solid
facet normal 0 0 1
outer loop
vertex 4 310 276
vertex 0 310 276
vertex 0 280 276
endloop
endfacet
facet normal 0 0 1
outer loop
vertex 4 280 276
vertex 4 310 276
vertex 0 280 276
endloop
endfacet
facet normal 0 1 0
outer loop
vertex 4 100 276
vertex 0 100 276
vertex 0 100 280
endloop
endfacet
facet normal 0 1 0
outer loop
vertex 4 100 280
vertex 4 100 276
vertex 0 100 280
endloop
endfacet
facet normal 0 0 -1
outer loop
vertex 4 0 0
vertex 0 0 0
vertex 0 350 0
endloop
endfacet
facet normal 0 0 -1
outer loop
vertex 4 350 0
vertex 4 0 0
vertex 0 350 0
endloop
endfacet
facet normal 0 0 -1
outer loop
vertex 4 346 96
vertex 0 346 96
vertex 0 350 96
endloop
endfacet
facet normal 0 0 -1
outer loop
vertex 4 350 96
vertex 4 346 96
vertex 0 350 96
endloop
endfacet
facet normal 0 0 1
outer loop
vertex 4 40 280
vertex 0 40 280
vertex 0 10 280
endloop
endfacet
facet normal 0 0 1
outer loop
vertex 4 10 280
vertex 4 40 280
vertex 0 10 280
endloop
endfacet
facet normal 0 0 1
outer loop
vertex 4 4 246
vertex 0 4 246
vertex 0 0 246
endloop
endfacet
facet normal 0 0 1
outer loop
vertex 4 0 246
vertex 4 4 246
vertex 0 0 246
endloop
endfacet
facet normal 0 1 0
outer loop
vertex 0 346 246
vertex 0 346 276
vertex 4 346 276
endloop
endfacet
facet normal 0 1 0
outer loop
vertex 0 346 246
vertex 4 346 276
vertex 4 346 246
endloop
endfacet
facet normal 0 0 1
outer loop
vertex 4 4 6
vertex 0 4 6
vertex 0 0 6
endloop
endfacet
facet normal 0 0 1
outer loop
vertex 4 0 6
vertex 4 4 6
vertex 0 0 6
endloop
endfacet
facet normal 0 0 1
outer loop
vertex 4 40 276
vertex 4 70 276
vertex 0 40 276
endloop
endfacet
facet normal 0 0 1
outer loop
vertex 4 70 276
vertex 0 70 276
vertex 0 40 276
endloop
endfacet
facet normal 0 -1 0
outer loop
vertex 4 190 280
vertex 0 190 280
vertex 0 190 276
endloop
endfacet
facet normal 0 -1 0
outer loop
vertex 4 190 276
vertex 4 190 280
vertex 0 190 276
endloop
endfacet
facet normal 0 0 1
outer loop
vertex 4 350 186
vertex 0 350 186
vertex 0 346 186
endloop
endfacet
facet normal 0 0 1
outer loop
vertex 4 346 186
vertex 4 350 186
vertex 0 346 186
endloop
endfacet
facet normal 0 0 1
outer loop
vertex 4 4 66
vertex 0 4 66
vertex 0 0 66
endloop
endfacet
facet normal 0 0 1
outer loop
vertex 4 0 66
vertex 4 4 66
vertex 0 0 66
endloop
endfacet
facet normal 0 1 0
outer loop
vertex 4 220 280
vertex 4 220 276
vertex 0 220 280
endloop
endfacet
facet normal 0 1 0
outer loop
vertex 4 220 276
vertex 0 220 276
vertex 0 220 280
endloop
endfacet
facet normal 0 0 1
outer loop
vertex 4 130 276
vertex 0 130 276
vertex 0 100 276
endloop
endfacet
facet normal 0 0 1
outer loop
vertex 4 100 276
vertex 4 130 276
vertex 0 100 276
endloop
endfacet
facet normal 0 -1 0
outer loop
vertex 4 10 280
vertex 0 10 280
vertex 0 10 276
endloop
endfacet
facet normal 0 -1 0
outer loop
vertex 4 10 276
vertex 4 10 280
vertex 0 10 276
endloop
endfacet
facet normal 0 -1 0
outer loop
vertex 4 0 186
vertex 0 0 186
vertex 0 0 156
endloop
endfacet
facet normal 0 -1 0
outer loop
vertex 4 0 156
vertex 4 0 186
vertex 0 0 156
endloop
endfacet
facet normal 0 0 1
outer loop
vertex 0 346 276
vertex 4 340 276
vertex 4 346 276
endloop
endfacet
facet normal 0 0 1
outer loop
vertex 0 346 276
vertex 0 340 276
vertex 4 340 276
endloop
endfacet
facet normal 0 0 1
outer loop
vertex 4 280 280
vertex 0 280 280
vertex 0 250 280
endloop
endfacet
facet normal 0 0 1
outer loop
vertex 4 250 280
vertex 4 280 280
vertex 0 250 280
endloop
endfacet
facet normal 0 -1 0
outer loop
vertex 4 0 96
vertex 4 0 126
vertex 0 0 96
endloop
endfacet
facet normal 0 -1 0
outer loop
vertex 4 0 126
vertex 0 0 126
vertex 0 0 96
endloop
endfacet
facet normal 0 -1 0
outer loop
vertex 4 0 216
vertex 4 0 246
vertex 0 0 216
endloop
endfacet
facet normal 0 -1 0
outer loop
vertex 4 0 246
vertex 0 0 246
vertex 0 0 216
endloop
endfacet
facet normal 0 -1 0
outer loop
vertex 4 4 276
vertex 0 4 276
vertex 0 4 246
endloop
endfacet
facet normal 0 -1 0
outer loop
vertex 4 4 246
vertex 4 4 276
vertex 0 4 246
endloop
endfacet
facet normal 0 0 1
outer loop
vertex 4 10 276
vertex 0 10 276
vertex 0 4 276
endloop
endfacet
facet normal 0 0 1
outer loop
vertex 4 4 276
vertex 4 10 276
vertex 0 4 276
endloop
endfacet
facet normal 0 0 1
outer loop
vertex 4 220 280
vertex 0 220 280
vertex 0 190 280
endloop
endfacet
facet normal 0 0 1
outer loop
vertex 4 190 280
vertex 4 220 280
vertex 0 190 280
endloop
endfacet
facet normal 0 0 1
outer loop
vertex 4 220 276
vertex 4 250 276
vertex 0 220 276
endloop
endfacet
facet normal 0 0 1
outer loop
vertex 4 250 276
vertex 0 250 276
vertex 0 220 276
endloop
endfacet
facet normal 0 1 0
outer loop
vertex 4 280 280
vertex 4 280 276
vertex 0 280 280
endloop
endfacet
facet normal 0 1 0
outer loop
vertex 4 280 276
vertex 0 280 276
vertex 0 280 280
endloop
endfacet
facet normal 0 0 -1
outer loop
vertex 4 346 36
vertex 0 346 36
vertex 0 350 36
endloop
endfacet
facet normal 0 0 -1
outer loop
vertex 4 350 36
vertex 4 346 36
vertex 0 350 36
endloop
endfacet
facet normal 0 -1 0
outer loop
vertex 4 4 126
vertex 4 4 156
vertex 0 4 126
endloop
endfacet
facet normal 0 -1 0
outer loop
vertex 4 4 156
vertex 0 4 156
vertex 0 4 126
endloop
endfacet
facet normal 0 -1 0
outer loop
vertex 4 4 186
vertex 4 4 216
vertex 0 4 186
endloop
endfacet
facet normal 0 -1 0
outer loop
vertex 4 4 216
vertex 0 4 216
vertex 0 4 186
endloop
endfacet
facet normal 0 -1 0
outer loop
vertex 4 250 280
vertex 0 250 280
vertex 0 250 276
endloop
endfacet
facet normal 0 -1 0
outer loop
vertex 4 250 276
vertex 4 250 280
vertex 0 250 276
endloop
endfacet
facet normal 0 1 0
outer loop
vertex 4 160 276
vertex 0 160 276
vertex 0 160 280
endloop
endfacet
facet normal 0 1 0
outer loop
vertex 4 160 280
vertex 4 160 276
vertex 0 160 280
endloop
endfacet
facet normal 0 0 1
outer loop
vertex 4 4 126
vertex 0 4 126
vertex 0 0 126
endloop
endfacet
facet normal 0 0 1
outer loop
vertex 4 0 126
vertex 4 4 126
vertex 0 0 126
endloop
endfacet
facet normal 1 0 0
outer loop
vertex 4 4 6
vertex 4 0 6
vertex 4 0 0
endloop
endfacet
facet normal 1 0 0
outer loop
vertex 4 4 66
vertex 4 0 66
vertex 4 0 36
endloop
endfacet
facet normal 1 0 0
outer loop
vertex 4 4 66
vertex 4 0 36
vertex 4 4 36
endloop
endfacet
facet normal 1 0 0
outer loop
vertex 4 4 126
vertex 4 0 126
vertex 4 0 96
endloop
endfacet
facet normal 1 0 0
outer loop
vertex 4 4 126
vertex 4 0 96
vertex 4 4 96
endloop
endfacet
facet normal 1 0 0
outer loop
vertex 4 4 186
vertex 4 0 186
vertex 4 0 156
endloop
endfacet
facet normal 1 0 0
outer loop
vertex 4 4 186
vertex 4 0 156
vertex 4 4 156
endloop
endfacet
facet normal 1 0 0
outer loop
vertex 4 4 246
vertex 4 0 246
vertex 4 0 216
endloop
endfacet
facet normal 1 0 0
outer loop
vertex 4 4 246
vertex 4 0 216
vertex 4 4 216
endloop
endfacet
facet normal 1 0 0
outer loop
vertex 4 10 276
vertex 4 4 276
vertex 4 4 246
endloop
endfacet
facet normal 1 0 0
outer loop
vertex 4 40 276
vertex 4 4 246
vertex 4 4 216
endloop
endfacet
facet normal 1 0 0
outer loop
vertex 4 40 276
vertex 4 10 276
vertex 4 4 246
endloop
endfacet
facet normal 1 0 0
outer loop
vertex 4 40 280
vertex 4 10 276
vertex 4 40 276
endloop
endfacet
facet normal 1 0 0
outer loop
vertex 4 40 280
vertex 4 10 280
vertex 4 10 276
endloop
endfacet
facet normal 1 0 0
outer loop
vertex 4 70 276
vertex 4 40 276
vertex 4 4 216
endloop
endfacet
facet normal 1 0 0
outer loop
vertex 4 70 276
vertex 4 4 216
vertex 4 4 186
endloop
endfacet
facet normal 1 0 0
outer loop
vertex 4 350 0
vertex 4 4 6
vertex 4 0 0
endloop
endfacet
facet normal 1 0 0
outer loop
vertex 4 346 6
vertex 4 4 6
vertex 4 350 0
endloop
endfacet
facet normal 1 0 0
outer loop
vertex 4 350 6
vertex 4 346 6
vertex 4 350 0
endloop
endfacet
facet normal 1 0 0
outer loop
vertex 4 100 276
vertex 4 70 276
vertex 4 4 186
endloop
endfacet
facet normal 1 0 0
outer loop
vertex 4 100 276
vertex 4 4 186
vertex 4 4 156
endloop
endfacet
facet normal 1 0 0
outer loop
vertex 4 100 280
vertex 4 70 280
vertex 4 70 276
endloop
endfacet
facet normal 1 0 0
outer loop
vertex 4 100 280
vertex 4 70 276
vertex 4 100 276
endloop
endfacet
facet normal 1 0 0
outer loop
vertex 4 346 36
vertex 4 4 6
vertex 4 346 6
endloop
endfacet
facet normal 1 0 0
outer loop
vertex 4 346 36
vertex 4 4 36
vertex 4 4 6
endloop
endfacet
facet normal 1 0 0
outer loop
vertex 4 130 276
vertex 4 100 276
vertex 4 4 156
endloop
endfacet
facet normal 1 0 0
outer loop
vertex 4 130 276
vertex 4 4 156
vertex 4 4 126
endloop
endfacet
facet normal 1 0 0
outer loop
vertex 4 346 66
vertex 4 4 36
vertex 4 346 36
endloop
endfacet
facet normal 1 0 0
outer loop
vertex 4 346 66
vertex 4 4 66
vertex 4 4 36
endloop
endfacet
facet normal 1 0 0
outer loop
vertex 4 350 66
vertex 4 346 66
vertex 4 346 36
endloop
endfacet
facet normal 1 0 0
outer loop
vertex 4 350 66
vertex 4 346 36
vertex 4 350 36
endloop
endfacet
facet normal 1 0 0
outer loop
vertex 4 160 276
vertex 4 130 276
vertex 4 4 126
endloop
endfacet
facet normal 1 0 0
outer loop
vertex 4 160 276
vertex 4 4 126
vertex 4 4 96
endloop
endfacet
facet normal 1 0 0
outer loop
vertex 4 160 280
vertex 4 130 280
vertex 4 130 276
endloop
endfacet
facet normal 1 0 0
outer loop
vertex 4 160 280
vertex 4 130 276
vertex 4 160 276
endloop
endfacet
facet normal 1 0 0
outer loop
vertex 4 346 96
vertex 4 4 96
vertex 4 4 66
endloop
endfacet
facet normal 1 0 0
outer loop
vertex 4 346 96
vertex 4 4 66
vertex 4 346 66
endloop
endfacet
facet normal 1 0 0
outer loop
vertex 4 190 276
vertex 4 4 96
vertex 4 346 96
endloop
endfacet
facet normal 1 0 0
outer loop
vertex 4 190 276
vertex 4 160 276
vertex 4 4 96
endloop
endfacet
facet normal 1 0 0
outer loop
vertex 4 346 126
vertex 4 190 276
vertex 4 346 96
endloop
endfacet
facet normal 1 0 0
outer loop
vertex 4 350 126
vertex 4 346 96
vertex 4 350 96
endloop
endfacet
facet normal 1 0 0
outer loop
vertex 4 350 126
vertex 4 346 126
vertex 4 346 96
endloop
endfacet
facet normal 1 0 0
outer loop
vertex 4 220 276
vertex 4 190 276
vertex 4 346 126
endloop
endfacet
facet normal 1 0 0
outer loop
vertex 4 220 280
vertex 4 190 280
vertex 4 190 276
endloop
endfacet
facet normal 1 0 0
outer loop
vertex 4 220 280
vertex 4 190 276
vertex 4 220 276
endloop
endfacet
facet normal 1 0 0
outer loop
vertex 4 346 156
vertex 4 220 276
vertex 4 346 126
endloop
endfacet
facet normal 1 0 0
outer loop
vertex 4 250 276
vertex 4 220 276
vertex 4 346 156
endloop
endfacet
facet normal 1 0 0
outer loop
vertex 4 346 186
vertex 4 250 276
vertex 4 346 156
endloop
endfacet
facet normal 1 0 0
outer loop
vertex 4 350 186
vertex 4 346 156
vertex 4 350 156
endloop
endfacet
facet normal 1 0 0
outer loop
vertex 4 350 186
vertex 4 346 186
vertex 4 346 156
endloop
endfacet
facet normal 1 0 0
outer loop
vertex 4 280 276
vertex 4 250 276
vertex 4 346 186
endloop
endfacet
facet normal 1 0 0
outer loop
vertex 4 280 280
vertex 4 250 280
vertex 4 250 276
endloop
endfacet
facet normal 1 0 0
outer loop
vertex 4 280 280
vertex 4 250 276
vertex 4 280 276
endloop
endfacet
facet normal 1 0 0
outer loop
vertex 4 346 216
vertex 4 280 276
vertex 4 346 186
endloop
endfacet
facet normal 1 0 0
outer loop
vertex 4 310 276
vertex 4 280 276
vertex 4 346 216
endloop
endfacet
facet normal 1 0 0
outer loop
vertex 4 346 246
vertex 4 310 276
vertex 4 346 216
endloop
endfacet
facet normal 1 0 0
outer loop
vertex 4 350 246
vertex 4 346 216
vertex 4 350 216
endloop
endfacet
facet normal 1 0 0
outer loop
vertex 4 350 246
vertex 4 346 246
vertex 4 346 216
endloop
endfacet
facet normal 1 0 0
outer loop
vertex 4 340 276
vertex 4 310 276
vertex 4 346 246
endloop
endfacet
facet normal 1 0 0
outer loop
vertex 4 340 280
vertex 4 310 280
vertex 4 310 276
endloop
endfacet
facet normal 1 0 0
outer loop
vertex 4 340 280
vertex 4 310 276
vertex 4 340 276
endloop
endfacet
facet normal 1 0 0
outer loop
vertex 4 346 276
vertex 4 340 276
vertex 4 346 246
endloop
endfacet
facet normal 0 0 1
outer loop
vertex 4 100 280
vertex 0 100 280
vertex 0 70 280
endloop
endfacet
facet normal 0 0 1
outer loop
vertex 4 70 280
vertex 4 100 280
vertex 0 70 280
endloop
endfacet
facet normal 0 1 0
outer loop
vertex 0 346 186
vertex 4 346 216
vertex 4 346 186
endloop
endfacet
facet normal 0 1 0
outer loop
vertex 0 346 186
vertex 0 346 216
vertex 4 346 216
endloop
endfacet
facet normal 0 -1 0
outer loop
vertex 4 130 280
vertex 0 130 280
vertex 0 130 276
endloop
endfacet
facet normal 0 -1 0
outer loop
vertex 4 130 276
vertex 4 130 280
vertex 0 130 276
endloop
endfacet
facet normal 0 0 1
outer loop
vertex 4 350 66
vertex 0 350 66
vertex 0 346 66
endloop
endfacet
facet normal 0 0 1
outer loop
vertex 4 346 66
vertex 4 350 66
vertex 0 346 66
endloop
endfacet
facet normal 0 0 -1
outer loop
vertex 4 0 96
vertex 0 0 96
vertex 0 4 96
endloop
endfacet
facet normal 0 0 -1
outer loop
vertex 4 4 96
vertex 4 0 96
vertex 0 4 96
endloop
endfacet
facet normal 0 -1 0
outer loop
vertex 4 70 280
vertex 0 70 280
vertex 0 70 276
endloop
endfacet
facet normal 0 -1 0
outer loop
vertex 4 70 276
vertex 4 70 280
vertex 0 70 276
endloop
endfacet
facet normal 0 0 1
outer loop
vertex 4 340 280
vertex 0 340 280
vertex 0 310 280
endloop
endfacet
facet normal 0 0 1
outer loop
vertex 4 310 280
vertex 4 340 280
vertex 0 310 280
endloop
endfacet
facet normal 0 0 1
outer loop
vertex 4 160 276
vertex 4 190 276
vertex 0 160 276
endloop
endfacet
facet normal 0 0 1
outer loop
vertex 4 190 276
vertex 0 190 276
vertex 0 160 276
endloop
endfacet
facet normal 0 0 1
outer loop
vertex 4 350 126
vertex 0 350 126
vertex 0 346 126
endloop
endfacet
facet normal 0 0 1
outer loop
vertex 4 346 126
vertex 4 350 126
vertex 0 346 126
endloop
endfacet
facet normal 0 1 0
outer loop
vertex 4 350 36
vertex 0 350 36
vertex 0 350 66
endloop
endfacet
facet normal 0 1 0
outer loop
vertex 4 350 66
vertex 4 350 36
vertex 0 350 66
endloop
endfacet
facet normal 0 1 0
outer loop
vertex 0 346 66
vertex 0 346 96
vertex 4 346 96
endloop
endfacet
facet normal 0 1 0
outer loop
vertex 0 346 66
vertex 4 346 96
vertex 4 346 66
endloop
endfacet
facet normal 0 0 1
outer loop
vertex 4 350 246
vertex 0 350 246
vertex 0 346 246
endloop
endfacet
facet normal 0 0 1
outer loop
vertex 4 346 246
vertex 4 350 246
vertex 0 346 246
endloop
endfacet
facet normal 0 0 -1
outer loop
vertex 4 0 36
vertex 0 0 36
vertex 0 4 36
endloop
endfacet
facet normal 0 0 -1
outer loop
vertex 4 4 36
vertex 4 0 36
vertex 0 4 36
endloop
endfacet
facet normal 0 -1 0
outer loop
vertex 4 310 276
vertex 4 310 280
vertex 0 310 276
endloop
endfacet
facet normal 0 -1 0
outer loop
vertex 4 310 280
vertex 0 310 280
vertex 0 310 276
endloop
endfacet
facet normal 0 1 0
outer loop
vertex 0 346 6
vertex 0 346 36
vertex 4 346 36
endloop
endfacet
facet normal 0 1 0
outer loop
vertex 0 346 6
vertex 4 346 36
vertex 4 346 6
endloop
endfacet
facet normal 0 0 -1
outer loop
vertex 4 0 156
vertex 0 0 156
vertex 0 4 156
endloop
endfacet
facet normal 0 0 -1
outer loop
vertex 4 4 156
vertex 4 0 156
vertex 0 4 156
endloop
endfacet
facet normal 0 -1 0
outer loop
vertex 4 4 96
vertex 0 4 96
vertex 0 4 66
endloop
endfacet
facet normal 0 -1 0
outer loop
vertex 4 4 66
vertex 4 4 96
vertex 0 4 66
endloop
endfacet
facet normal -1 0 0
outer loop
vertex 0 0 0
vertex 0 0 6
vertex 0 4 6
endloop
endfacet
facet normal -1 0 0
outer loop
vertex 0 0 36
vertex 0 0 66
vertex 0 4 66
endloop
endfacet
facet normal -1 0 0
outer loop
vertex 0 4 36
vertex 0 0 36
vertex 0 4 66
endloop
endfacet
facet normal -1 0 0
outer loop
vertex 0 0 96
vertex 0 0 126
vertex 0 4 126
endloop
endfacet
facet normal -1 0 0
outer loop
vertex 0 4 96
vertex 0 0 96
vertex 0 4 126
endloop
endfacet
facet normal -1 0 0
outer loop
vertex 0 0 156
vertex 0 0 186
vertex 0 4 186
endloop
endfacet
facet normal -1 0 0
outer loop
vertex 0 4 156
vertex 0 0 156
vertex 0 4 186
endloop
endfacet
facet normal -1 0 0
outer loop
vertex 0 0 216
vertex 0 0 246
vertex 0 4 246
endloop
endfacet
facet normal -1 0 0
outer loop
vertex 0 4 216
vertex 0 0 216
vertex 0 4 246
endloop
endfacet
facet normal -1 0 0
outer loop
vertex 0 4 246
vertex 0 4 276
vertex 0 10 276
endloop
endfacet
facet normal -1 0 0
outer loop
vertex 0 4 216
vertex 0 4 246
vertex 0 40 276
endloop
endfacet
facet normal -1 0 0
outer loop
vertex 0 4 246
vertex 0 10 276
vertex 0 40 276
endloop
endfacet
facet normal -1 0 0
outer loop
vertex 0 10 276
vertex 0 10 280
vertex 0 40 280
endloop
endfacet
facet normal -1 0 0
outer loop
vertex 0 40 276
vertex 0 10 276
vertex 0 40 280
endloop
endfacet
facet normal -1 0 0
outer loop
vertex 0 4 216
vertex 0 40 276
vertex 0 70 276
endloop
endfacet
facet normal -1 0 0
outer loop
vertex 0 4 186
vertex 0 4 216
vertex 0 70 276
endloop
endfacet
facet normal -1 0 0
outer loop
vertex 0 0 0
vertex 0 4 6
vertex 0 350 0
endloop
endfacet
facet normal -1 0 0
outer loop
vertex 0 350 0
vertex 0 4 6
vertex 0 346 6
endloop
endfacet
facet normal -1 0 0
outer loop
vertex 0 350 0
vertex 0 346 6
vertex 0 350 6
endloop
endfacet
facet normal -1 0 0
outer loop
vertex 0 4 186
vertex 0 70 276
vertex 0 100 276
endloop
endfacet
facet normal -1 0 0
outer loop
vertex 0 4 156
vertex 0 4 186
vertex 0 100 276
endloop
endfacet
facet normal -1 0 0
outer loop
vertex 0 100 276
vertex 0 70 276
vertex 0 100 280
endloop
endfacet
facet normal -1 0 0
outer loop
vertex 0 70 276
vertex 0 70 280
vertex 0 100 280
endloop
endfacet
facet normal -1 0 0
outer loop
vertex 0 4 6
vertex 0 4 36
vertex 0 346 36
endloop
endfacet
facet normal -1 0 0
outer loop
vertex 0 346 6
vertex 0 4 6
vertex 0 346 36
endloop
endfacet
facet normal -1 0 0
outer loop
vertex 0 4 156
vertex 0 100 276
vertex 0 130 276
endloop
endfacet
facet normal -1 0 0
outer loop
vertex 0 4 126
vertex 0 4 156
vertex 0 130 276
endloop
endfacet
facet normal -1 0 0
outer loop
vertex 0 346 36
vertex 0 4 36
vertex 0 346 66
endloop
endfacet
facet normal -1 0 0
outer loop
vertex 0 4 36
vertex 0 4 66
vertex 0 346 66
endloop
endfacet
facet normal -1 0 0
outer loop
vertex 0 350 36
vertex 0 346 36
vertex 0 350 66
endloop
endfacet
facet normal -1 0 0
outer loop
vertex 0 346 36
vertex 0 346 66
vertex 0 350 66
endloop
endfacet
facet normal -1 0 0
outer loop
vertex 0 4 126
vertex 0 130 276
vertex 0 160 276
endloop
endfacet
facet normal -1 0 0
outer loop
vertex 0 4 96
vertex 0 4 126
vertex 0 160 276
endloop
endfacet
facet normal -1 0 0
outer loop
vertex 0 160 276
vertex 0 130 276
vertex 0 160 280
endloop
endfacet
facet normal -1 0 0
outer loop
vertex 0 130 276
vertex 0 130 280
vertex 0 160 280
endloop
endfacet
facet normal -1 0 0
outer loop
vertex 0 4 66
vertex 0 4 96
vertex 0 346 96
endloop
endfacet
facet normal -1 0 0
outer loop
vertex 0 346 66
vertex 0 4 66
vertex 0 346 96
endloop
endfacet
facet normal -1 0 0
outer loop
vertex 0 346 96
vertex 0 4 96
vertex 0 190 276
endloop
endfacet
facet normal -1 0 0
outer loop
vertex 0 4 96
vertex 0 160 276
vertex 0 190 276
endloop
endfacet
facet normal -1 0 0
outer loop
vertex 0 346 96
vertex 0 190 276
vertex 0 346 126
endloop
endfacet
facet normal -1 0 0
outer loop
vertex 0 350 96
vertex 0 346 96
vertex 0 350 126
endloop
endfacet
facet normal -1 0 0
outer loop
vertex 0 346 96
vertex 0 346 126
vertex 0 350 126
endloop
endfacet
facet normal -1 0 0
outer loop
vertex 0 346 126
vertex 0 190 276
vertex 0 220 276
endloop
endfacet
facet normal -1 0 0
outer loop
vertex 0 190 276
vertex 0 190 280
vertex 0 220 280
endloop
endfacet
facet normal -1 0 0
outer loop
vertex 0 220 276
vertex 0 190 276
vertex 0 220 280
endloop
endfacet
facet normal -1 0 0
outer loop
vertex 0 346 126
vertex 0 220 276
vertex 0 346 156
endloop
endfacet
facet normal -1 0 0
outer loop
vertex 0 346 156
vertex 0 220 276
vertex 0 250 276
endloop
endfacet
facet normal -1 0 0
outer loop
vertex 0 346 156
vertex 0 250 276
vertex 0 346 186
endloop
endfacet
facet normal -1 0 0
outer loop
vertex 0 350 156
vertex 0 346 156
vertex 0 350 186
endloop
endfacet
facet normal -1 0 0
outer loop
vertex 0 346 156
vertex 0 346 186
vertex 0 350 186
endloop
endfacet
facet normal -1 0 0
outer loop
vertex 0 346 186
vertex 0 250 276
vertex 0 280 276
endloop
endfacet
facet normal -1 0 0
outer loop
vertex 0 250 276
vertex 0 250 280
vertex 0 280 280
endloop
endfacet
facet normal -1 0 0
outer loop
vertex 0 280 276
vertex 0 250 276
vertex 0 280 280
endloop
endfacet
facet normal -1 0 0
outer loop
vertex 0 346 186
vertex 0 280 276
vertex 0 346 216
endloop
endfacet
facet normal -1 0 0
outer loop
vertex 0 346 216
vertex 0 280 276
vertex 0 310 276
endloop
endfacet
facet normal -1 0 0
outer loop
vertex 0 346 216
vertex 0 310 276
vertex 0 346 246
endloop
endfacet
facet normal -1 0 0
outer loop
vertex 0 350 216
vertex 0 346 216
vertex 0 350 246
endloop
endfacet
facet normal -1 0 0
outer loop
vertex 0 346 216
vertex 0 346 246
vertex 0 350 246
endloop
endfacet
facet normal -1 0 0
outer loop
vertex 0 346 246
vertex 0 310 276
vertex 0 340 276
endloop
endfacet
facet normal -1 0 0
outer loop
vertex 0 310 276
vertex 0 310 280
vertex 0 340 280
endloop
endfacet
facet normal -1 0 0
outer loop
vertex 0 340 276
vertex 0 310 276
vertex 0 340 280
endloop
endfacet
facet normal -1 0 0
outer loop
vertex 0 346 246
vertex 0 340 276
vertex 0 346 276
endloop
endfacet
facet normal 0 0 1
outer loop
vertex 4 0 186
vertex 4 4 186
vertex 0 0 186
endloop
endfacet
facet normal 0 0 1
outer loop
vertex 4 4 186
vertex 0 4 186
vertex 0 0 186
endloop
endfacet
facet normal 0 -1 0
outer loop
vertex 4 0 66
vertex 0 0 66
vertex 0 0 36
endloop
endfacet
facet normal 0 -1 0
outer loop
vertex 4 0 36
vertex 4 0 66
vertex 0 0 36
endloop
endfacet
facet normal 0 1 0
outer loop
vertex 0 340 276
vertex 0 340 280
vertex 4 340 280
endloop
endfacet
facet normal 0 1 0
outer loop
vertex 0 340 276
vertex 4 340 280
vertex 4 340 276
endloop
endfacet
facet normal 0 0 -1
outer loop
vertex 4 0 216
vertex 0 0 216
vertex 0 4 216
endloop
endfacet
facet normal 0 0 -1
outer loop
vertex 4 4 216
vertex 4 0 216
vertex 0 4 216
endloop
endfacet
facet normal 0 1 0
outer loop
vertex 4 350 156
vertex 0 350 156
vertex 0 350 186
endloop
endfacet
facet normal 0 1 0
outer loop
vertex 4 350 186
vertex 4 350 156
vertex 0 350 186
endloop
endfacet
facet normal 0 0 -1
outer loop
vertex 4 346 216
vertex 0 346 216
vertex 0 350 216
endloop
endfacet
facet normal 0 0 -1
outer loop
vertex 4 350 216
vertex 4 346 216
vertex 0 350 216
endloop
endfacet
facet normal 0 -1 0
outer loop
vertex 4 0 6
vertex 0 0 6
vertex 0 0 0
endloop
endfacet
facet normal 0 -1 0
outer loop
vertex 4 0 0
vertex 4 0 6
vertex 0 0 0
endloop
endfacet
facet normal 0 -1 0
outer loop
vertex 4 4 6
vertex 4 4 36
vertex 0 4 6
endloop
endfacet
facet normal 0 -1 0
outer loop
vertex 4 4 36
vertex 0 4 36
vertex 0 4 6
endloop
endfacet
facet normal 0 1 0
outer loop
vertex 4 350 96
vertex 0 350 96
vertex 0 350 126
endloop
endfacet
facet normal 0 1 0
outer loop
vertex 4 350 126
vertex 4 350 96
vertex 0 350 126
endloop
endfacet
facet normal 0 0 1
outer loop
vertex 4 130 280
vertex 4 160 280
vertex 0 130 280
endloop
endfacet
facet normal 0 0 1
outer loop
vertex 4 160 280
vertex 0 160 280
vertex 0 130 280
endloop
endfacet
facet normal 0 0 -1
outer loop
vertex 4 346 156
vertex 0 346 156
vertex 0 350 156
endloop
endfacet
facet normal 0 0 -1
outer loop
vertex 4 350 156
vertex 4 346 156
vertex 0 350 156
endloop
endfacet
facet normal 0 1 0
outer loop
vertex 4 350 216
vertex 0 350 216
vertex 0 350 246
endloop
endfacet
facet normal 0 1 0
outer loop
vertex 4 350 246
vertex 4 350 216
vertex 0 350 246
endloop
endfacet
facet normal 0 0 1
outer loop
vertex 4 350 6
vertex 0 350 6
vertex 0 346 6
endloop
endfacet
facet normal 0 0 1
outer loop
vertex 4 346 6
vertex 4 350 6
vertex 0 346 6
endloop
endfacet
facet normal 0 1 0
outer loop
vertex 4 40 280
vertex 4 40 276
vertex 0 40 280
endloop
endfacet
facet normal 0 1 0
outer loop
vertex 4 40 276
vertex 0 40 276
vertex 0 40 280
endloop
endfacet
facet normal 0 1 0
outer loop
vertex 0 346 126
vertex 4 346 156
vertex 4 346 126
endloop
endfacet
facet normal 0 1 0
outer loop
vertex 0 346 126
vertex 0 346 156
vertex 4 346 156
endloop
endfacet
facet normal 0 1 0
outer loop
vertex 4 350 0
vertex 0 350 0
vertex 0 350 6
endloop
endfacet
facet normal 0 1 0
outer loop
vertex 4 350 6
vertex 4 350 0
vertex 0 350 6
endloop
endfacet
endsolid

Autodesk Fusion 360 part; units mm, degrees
sketch "Sketch1" plane through (0, 0, 0) normal (1, 0, 0) x (0, 1, 0)
  line L0 (0, 0) -> (350, 0)
  line L1 (350, 0) -> (350, 280)
  line L2 (350, 280) -> (0, 280)
  line L3 (0, 280) -> (0, 0)
  line L4 (0, 276) -> (4, 276)
  line L5 (4, 276) -> (4, 246)
  line L6 (4, 246) -> (0, 246)
  line L7 (0, 246) -> (0, 276)
  line L8 (40, 280) -> (70, 280)
  line L9 (70, 280) -> (70, 276)
  line L10 (70, 276) -> (40, 276)
  line L11 (40, 276) -> (40, 280)
  line L12 (0, 280) -> (10, 280)
  line L13 (10, 280) -> (10, 276)
  line L14 (10, 276) -> (0, 276)
  line L15 (0, 276) -> (0, 280)
  dimension "d5" = 350
  dimension "d6" = 280
  dimension "d7" = 30
  dimension "d8" = 30
  dimension "d9" = 4
  dimension "d10" = 4
  dimension "d14" = 10
  dimension "d15" = 4
  dimension "d16" = 30
extrude "Extrude1" add sketch "Sketch1" along normal blind 4 makes body 1
extrude "Extrude2" cut sketch "Sketch1" along normal through all contours L3 L4 L5 L6 L7 L14 bodies 1
extrude "Extrude3" cut sketch "Sketch1" along normal through all contours L2 L3 L4 L12 L13 L14 L15 bodies 1
extrude "Extrude4" cut sketch "Sketch1" along normal through all contours L2 L8 L9 L10 L11 bodies 1
pattern_linear "R-Pattern1" count 5 spacing 60 along (0, 0, -1) count 2 spacing 346 along (0, 1, 0) of "Extrude2"
pattern_linear "R-Pattern2" count 2 spacing 340 along (0, 1, 0) of "Extrude3"
pattern_linear "R-Pattern3" count 5 spacing 60 along (0, 1, 0) of "Extrude4"
copy_body "Body->Comp1" bodies 1 removing the originals makes body 2 in component "Component"
component "Component" placed x (1, 0, 0) y (0, 1, 0) z (0, 0, 1) at (0, 0, 0)
equation "d = 350 mm"
equation "h = 280 mm"
equation "a = 30 mm"
equation "t = 4 mm"
equation "d5 = d"
equation "d6 = h"
equation "d9 = t"
equation "d10 = t"
equation "a_d = ( d - floor(d / a) * a ) / 2"
equation "d14 = a_d"
equation "d15 = t"
equation "d16 = a"
equation "d17 = t"
equation "n_h = floor(floor(h / a) / 2) + 1"
equation "n_d = floor(floor(d / a) / 2)"
equation "d25 = n_h"
equation "d27 = a * 2"
equation "d28 = d - t"
equation "d31 = d - a_d"
equation "d33 = n_d"
equation "d35 = 2 * a"
